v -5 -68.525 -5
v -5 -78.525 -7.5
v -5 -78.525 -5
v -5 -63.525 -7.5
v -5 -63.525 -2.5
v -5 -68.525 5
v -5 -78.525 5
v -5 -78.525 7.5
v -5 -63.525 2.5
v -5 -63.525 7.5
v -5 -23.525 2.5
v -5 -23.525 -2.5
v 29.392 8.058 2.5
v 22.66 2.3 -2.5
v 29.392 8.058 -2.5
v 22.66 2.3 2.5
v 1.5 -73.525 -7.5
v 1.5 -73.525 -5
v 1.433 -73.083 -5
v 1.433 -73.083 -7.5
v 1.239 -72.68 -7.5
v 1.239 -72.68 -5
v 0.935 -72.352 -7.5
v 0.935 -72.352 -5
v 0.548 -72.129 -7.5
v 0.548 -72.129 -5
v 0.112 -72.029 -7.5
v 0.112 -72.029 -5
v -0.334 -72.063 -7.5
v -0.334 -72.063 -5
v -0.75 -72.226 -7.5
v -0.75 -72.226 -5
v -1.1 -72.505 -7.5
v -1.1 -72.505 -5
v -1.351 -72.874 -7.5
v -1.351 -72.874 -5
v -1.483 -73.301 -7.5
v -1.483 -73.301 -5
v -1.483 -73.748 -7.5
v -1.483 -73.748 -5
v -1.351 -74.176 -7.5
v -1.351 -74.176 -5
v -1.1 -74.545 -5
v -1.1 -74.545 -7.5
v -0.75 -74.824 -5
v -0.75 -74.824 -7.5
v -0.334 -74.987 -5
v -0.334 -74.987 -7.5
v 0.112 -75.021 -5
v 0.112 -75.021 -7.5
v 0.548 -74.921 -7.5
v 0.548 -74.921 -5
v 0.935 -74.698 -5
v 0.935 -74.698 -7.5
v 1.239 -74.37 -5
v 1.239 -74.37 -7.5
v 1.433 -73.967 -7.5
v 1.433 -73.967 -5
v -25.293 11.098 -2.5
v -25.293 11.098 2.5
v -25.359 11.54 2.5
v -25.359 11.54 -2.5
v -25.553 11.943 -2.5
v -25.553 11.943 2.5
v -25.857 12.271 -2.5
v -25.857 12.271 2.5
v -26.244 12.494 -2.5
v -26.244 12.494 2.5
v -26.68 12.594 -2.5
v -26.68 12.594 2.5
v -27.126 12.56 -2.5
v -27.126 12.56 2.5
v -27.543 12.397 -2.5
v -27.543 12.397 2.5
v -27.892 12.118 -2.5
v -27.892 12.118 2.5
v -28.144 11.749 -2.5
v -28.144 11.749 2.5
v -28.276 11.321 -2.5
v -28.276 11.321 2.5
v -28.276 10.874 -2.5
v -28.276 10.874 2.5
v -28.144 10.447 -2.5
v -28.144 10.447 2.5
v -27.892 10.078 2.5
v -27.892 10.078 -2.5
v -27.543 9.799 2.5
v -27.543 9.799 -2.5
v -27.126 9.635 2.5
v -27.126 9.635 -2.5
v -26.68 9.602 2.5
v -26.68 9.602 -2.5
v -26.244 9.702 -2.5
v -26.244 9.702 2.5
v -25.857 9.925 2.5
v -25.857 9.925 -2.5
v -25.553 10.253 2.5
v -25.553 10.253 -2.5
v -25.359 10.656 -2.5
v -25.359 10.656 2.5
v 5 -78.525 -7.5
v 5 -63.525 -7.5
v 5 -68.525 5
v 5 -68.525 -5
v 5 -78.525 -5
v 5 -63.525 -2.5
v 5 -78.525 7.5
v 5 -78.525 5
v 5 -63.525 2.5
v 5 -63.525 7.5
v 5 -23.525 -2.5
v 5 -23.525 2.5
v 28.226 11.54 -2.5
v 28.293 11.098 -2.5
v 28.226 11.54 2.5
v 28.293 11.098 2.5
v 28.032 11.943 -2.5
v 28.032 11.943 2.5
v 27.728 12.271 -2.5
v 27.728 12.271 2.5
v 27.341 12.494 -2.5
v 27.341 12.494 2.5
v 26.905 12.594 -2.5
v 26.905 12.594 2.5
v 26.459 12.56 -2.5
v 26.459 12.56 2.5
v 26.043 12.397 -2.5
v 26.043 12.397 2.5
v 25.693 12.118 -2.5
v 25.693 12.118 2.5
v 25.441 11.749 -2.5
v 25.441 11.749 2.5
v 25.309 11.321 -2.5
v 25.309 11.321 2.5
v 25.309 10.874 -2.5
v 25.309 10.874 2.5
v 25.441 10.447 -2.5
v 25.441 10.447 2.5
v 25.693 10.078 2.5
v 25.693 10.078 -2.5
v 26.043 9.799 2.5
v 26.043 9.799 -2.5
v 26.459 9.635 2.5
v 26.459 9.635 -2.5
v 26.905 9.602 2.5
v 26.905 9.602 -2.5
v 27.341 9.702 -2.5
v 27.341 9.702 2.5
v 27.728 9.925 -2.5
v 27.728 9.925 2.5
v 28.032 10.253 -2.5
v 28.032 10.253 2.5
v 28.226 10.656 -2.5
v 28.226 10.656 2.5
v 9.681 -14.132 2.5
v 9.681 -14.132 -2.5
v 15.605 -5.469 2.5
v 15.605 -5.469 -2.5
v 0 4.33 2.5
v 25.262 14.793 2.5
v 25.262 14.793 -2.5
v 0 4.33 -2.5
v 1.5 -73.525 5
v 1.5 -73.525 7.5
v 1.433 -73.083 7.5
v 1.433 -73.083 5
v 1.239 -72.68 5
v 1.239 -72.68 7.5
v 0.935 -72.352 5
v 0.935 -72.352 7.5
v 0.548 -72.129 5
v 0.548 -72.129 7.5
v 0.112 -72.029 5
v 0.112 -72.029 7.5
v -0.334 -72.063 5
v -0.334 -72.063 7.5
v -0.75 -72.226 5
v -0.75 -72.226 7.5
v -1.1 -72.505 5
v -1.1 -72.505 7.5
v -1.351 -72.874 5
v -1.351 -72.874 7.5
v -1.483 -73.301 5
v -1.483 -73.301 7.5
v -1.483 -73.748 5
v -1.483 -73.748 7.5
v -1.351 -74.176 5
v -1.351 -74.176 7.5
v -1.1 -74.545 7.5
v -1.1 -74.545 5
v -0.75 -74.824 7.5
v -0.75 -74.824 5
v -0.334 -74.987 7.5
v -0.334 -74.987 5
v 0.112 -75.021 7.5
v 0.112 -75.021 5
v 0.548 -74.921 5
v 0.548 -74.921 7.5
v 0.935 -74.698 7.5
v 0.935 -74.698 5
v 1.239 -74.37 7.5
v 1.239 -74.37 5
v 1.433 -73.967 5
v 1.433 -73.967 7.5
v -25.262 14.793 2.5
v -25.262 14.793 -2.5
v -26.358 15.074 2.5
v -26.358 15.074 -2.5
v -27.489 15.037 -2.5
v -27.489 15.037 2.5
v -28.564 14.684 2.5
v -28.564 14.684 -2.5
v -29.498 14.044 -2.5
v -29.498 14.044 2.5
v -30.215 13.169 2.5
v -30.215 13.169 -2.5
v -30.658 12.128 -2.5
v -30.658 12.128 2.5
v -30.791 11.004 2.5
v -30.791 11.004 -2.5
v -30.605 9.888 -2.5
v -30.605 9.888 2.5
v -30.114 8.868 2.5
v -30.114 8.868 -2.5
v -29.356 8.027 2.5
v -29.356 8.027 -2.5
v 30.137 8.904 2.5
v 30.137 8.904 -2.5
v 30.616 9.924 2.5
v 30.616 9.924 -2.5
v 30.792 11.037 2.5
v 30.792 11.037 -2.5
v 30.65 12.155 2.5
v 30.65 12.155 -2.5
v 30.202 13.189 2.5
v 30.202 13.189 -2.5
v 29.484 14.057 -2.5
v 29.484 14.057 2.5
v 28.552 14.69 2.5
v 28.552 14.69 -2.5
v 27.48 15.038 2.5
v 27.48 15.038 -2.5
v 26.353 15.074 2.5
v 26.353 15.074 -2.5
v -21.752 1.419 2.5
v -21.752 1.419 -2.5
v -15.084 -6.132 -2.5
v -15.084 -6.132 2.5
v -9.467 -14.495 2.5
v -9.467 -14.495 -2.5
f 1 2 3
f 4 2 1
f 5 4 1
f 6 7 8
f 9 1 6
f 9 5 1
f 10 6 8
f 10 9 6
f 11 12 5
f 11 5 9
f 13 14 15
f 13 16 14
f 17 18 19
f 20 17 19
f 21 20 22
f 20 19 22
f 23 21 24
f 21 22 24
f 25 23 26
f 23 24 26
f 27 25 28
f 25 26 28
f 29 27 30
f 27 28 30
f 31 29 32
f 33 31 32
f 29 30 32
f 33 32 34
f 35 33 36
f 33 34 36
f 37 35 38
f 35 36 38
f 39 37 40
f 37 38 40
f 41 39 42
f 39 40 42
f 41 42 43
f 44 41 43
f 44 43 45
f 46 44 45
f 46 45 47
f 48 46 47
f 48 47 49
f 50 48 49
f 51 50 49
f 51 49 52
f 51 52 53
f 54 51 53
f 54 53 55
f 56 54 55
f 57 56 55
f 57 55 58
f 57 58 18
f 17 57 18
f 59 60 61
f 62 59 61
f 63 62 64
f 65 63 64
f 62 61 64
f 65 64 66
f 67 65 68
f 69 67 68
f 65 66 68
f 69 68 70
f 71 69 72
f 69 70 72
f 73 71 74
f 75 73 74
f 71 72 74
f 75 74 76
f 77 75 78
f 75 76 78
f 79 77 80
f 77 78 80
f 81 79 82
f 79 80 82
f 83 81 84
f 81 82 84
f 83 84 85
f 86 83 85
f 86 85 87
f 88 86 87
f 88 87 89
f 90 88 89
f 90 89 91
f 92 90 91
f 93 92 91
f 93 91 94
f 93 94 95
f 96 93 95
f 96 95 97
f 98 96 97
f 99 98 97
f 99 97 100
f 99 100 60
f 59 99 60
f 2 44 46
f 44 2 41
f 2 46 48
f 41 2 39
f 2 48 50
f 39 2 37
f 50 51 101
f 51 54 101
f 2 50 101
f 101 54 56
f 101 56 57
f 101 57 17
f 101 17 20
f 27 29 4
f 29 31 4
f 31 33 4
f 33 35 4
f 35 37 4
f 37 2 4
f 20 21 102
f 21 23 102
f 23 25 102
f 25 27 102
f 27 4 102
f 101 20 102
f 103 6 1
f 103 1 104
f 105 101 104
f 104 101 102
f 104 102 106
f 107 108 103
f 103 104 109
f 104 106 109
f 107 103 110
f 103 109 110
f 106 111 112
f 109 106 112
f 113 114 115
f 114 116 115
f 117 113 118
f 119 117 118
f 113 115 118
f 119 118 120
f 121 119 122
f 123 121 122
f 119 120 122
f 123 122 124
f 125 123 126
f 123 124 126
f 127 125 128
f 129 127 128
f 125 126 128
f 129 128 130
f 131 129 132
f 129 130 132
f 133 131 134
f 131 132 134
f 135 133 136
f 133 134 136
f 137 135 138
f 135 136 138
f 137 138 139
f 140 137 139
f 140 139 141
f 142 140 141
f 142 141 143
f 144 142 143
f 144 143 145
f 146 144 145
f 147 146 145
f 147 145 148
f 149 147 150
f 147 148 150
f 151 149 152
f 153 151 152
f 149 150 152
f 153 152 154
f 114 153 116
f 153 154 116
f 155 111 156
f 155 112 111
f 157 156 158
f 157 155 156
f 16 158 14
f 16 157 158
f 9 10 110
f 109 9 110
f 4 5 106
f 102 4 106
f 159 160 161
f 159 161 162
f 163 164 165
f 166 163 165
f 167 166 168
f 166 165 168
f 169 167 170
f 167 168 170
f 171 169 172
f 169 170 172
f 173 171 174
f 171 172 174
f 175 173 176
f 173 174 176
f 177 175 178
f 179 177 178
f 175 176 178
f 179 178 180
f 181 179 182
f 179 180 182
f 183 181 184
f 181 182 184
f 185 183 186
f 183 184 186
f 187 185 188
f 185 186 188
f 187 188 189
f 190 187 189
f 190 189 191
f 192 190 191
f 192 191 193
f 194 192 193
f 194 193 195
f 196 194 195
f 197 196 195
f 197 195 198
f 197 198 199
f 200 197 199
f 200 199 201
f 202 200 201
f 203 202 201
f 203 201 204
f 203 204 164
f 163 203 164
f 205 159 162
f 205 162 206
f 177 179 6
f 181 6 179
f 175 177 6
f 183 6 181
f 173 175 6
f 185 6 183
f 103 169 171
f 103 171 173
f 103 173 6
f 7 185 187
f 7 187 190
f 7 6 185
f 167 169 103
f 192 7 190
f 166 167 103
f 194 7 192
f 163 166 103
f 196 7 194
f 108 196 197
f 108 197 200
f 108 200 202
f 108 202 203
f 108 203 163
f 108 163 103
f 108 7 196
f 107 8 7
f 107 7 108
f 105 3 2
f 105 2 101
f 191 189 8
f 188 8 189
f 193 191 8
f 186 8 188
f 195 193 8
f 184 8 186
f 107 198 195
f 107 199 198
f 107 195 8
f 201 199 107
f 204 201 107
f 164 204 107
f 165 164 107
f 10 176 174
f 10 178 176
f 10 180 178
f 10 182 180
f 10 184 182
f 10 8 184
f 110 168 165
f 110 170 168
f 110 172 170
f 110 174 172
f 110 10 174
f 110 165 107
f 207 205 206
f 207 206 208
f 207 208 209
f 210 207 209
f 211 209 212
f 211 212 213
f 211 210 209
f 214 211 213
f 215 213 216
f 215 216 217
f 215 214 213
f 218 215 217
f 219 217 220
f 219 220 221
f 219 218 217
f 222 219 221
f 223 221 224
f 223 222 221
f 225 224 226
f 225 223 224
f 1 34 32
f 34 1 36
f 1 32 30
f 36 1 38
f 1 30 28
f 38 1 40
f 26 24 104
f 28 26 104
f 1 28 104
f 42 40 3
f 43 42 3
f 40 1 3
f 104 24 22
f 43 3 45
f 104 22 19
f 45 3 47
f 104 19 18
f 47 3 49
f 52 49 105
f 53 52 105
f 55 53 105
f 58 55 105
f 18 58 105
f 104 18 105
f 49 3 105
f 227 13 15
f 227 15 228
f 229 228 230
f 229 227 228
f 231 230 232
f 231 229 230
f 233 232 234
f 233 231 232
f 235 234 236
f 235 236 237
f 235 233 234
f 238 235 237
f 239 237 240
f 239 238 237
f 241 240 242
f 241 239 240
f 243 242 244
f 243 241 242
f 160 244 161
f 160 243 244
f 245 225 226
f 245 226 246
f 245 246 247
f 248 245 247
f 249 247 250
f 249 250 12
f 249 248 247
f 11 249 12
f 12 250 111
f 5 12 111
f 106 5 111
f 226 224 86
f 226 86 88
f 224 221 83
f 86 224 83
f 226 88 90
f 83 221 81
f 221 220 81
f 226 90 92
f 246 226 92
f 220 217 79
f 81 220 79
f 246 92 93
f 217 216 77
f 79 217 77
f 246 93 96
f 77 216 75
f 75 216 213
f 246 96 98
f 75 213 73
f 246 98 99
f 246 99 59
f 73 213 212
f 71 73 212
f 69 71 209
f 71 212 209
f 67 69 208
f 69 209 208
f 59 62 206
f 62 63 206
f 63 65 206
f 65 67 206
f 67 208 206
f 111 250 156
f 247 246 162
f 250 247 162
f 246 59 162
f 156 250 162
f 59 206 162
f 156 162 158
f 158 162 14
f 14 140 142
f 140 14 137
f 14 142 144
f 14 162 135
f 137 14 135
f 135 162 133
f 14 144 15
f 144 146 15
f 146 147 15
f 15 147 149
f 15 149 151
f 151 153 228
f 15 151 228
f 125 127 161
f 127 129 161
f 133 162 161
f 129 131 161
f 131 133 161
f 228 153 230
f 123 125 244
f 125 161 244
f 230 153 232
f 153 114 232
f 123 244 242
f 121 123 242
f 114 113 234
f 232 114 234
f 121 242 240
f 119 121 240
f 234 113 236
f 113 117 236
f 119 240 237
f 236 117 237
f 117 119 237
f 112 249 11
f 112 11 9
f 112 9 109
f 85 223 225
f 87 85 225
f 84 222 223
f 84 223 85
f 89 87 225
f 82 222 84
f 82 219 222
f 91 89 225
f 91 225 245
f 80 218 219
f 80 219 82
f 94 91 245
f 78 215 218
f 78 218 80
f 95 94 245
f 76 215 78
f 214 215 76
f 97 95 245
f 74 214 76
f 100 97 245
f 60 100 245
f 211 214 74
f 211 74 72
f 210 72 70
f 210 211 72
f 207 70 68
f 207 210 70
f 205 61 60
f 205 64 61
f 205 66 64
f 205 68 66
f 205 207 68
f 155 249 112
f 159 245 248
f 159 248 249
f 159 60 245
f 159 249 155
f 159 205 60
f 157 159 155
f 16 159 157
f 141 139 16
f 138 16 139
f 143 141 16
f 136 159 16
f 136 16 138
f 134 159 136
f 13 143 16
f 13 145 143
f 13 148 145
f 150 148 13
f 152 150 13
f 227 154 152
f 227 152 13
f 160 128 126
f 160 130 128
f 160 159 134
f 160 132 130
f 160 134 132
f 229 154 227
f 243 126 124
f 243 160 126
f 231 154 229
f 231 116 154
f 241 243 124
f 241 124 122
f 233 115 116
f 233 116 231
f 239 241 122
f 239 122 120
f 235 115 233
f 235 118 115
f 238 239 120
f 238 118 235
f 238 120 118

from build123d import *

# Parameters (mm, degrees)
Y_KSEKLIK_EKSTR_ZYON1_DEPTH = 2.5
IZIM2_R                     = 1.5
KES_EKSTR_ZYON1_DEPTH       = 11
IZIM3_W                     = 10
IZIM3_H                     = 15
Y_KSEKLIK_EKSTR_ZYON2_DEPTH = 15
IZIM4_W                     = 10
IZIM4_H                     = 10
KES_EKSTR_ZYON2_DEPTH       = 10
IZIM5_R                     = 1.5
KES_EKSTR_ZYON3_DEPTH       = 18


with BuildPart() as part:
    # Çizim1 → Yükseklik-Ekstrüzyon1 (new, symmetric)
    with BuildSketch(Plane.XY):
        with BuildLine():
            Line((22.660097643, 2.30045544), (29.392284146, 8.057892583))
            ThreePointArc((29.392284146, 8.057892583), (30.202384575, 13.188927169), (25.261772713, 14.793337669))
            Line((25.261772713, 14.793337669), (0, 4.329568801))
            Line((0, 4.329568801), (-25.261772713, 14.793337669))
            ThreePointArc((-25.261772713, 14.793337669), (-30.21464291, 13.168805295), (-29.356291498, 8.02747653))
            ThreePointArc((-29.356291498, 8.02747653), (-15.084034375, -6.132217103), (-5, -23.524931034))
            Line((-5, -23.524931034), (-5, -63.524931034))
            Line((-5, -63.524931034), (5, -63.524931034))
            Line((5, -63.524931034), (5, -23.524931034))
            ThreePointArc((5, -23.524931034), (12.493835858, -9.698499239), (22.660097643, 2.30045544))
        make_face()
    extrude(amount=Y_KSEKLIK_EKSTR_ZYON1_DEPTH, both=True)

    # Çizim2 → Kes-Ekstrüzyon1 (cut, symmetric)
    with BuildSketch(Plane.XY.offset(2.5)):
        with Locations((-26.792506443, 11.097819539)):
            Circle(IZIM2_R)
        with Locations((26.792506443, 11.097819539)):
            Circle(IZIM2_R)
    extrude(amount=KES_EKSTR_ZYON1_DEPTH, both=True, mode=Mode.SUBTRACT)

    # Çizim3 → Yükseklik-Ekstrüzyon2 (add)
    with BuildSketch(Plane.XZ.offset(63.524931034)):
        Rectangle(IZIM3_W, IZIM3_H)
    extrude(amount=Y_KSEKLIK_EKSTR_ZYON2_DEPTH)

    # Çizim4 → Kes-Ekstrüzyon2 (cut)
    with BuildSketch(Plane.XZ.offset(78.524931034)):
        Rectangle(IZIM4_W, IZIM4_H)
    extrude(amount=-KES_EKSTR_ZYON2_DEPTH, mode=Mode.SUBTRACT)

    # Çizim5 → Kes-Ekstrüzyon3 (cut)
    with BuildSketch(Plane.XY.offset(7.5)):
        with Locations((0, -73.524931034)):
            Circle(IZIM5_R)
    extrude(amount=-KES_EKSTR_ZYON3_DEPTH, mode=Mode.SUBTRACT)


solid = part.part
